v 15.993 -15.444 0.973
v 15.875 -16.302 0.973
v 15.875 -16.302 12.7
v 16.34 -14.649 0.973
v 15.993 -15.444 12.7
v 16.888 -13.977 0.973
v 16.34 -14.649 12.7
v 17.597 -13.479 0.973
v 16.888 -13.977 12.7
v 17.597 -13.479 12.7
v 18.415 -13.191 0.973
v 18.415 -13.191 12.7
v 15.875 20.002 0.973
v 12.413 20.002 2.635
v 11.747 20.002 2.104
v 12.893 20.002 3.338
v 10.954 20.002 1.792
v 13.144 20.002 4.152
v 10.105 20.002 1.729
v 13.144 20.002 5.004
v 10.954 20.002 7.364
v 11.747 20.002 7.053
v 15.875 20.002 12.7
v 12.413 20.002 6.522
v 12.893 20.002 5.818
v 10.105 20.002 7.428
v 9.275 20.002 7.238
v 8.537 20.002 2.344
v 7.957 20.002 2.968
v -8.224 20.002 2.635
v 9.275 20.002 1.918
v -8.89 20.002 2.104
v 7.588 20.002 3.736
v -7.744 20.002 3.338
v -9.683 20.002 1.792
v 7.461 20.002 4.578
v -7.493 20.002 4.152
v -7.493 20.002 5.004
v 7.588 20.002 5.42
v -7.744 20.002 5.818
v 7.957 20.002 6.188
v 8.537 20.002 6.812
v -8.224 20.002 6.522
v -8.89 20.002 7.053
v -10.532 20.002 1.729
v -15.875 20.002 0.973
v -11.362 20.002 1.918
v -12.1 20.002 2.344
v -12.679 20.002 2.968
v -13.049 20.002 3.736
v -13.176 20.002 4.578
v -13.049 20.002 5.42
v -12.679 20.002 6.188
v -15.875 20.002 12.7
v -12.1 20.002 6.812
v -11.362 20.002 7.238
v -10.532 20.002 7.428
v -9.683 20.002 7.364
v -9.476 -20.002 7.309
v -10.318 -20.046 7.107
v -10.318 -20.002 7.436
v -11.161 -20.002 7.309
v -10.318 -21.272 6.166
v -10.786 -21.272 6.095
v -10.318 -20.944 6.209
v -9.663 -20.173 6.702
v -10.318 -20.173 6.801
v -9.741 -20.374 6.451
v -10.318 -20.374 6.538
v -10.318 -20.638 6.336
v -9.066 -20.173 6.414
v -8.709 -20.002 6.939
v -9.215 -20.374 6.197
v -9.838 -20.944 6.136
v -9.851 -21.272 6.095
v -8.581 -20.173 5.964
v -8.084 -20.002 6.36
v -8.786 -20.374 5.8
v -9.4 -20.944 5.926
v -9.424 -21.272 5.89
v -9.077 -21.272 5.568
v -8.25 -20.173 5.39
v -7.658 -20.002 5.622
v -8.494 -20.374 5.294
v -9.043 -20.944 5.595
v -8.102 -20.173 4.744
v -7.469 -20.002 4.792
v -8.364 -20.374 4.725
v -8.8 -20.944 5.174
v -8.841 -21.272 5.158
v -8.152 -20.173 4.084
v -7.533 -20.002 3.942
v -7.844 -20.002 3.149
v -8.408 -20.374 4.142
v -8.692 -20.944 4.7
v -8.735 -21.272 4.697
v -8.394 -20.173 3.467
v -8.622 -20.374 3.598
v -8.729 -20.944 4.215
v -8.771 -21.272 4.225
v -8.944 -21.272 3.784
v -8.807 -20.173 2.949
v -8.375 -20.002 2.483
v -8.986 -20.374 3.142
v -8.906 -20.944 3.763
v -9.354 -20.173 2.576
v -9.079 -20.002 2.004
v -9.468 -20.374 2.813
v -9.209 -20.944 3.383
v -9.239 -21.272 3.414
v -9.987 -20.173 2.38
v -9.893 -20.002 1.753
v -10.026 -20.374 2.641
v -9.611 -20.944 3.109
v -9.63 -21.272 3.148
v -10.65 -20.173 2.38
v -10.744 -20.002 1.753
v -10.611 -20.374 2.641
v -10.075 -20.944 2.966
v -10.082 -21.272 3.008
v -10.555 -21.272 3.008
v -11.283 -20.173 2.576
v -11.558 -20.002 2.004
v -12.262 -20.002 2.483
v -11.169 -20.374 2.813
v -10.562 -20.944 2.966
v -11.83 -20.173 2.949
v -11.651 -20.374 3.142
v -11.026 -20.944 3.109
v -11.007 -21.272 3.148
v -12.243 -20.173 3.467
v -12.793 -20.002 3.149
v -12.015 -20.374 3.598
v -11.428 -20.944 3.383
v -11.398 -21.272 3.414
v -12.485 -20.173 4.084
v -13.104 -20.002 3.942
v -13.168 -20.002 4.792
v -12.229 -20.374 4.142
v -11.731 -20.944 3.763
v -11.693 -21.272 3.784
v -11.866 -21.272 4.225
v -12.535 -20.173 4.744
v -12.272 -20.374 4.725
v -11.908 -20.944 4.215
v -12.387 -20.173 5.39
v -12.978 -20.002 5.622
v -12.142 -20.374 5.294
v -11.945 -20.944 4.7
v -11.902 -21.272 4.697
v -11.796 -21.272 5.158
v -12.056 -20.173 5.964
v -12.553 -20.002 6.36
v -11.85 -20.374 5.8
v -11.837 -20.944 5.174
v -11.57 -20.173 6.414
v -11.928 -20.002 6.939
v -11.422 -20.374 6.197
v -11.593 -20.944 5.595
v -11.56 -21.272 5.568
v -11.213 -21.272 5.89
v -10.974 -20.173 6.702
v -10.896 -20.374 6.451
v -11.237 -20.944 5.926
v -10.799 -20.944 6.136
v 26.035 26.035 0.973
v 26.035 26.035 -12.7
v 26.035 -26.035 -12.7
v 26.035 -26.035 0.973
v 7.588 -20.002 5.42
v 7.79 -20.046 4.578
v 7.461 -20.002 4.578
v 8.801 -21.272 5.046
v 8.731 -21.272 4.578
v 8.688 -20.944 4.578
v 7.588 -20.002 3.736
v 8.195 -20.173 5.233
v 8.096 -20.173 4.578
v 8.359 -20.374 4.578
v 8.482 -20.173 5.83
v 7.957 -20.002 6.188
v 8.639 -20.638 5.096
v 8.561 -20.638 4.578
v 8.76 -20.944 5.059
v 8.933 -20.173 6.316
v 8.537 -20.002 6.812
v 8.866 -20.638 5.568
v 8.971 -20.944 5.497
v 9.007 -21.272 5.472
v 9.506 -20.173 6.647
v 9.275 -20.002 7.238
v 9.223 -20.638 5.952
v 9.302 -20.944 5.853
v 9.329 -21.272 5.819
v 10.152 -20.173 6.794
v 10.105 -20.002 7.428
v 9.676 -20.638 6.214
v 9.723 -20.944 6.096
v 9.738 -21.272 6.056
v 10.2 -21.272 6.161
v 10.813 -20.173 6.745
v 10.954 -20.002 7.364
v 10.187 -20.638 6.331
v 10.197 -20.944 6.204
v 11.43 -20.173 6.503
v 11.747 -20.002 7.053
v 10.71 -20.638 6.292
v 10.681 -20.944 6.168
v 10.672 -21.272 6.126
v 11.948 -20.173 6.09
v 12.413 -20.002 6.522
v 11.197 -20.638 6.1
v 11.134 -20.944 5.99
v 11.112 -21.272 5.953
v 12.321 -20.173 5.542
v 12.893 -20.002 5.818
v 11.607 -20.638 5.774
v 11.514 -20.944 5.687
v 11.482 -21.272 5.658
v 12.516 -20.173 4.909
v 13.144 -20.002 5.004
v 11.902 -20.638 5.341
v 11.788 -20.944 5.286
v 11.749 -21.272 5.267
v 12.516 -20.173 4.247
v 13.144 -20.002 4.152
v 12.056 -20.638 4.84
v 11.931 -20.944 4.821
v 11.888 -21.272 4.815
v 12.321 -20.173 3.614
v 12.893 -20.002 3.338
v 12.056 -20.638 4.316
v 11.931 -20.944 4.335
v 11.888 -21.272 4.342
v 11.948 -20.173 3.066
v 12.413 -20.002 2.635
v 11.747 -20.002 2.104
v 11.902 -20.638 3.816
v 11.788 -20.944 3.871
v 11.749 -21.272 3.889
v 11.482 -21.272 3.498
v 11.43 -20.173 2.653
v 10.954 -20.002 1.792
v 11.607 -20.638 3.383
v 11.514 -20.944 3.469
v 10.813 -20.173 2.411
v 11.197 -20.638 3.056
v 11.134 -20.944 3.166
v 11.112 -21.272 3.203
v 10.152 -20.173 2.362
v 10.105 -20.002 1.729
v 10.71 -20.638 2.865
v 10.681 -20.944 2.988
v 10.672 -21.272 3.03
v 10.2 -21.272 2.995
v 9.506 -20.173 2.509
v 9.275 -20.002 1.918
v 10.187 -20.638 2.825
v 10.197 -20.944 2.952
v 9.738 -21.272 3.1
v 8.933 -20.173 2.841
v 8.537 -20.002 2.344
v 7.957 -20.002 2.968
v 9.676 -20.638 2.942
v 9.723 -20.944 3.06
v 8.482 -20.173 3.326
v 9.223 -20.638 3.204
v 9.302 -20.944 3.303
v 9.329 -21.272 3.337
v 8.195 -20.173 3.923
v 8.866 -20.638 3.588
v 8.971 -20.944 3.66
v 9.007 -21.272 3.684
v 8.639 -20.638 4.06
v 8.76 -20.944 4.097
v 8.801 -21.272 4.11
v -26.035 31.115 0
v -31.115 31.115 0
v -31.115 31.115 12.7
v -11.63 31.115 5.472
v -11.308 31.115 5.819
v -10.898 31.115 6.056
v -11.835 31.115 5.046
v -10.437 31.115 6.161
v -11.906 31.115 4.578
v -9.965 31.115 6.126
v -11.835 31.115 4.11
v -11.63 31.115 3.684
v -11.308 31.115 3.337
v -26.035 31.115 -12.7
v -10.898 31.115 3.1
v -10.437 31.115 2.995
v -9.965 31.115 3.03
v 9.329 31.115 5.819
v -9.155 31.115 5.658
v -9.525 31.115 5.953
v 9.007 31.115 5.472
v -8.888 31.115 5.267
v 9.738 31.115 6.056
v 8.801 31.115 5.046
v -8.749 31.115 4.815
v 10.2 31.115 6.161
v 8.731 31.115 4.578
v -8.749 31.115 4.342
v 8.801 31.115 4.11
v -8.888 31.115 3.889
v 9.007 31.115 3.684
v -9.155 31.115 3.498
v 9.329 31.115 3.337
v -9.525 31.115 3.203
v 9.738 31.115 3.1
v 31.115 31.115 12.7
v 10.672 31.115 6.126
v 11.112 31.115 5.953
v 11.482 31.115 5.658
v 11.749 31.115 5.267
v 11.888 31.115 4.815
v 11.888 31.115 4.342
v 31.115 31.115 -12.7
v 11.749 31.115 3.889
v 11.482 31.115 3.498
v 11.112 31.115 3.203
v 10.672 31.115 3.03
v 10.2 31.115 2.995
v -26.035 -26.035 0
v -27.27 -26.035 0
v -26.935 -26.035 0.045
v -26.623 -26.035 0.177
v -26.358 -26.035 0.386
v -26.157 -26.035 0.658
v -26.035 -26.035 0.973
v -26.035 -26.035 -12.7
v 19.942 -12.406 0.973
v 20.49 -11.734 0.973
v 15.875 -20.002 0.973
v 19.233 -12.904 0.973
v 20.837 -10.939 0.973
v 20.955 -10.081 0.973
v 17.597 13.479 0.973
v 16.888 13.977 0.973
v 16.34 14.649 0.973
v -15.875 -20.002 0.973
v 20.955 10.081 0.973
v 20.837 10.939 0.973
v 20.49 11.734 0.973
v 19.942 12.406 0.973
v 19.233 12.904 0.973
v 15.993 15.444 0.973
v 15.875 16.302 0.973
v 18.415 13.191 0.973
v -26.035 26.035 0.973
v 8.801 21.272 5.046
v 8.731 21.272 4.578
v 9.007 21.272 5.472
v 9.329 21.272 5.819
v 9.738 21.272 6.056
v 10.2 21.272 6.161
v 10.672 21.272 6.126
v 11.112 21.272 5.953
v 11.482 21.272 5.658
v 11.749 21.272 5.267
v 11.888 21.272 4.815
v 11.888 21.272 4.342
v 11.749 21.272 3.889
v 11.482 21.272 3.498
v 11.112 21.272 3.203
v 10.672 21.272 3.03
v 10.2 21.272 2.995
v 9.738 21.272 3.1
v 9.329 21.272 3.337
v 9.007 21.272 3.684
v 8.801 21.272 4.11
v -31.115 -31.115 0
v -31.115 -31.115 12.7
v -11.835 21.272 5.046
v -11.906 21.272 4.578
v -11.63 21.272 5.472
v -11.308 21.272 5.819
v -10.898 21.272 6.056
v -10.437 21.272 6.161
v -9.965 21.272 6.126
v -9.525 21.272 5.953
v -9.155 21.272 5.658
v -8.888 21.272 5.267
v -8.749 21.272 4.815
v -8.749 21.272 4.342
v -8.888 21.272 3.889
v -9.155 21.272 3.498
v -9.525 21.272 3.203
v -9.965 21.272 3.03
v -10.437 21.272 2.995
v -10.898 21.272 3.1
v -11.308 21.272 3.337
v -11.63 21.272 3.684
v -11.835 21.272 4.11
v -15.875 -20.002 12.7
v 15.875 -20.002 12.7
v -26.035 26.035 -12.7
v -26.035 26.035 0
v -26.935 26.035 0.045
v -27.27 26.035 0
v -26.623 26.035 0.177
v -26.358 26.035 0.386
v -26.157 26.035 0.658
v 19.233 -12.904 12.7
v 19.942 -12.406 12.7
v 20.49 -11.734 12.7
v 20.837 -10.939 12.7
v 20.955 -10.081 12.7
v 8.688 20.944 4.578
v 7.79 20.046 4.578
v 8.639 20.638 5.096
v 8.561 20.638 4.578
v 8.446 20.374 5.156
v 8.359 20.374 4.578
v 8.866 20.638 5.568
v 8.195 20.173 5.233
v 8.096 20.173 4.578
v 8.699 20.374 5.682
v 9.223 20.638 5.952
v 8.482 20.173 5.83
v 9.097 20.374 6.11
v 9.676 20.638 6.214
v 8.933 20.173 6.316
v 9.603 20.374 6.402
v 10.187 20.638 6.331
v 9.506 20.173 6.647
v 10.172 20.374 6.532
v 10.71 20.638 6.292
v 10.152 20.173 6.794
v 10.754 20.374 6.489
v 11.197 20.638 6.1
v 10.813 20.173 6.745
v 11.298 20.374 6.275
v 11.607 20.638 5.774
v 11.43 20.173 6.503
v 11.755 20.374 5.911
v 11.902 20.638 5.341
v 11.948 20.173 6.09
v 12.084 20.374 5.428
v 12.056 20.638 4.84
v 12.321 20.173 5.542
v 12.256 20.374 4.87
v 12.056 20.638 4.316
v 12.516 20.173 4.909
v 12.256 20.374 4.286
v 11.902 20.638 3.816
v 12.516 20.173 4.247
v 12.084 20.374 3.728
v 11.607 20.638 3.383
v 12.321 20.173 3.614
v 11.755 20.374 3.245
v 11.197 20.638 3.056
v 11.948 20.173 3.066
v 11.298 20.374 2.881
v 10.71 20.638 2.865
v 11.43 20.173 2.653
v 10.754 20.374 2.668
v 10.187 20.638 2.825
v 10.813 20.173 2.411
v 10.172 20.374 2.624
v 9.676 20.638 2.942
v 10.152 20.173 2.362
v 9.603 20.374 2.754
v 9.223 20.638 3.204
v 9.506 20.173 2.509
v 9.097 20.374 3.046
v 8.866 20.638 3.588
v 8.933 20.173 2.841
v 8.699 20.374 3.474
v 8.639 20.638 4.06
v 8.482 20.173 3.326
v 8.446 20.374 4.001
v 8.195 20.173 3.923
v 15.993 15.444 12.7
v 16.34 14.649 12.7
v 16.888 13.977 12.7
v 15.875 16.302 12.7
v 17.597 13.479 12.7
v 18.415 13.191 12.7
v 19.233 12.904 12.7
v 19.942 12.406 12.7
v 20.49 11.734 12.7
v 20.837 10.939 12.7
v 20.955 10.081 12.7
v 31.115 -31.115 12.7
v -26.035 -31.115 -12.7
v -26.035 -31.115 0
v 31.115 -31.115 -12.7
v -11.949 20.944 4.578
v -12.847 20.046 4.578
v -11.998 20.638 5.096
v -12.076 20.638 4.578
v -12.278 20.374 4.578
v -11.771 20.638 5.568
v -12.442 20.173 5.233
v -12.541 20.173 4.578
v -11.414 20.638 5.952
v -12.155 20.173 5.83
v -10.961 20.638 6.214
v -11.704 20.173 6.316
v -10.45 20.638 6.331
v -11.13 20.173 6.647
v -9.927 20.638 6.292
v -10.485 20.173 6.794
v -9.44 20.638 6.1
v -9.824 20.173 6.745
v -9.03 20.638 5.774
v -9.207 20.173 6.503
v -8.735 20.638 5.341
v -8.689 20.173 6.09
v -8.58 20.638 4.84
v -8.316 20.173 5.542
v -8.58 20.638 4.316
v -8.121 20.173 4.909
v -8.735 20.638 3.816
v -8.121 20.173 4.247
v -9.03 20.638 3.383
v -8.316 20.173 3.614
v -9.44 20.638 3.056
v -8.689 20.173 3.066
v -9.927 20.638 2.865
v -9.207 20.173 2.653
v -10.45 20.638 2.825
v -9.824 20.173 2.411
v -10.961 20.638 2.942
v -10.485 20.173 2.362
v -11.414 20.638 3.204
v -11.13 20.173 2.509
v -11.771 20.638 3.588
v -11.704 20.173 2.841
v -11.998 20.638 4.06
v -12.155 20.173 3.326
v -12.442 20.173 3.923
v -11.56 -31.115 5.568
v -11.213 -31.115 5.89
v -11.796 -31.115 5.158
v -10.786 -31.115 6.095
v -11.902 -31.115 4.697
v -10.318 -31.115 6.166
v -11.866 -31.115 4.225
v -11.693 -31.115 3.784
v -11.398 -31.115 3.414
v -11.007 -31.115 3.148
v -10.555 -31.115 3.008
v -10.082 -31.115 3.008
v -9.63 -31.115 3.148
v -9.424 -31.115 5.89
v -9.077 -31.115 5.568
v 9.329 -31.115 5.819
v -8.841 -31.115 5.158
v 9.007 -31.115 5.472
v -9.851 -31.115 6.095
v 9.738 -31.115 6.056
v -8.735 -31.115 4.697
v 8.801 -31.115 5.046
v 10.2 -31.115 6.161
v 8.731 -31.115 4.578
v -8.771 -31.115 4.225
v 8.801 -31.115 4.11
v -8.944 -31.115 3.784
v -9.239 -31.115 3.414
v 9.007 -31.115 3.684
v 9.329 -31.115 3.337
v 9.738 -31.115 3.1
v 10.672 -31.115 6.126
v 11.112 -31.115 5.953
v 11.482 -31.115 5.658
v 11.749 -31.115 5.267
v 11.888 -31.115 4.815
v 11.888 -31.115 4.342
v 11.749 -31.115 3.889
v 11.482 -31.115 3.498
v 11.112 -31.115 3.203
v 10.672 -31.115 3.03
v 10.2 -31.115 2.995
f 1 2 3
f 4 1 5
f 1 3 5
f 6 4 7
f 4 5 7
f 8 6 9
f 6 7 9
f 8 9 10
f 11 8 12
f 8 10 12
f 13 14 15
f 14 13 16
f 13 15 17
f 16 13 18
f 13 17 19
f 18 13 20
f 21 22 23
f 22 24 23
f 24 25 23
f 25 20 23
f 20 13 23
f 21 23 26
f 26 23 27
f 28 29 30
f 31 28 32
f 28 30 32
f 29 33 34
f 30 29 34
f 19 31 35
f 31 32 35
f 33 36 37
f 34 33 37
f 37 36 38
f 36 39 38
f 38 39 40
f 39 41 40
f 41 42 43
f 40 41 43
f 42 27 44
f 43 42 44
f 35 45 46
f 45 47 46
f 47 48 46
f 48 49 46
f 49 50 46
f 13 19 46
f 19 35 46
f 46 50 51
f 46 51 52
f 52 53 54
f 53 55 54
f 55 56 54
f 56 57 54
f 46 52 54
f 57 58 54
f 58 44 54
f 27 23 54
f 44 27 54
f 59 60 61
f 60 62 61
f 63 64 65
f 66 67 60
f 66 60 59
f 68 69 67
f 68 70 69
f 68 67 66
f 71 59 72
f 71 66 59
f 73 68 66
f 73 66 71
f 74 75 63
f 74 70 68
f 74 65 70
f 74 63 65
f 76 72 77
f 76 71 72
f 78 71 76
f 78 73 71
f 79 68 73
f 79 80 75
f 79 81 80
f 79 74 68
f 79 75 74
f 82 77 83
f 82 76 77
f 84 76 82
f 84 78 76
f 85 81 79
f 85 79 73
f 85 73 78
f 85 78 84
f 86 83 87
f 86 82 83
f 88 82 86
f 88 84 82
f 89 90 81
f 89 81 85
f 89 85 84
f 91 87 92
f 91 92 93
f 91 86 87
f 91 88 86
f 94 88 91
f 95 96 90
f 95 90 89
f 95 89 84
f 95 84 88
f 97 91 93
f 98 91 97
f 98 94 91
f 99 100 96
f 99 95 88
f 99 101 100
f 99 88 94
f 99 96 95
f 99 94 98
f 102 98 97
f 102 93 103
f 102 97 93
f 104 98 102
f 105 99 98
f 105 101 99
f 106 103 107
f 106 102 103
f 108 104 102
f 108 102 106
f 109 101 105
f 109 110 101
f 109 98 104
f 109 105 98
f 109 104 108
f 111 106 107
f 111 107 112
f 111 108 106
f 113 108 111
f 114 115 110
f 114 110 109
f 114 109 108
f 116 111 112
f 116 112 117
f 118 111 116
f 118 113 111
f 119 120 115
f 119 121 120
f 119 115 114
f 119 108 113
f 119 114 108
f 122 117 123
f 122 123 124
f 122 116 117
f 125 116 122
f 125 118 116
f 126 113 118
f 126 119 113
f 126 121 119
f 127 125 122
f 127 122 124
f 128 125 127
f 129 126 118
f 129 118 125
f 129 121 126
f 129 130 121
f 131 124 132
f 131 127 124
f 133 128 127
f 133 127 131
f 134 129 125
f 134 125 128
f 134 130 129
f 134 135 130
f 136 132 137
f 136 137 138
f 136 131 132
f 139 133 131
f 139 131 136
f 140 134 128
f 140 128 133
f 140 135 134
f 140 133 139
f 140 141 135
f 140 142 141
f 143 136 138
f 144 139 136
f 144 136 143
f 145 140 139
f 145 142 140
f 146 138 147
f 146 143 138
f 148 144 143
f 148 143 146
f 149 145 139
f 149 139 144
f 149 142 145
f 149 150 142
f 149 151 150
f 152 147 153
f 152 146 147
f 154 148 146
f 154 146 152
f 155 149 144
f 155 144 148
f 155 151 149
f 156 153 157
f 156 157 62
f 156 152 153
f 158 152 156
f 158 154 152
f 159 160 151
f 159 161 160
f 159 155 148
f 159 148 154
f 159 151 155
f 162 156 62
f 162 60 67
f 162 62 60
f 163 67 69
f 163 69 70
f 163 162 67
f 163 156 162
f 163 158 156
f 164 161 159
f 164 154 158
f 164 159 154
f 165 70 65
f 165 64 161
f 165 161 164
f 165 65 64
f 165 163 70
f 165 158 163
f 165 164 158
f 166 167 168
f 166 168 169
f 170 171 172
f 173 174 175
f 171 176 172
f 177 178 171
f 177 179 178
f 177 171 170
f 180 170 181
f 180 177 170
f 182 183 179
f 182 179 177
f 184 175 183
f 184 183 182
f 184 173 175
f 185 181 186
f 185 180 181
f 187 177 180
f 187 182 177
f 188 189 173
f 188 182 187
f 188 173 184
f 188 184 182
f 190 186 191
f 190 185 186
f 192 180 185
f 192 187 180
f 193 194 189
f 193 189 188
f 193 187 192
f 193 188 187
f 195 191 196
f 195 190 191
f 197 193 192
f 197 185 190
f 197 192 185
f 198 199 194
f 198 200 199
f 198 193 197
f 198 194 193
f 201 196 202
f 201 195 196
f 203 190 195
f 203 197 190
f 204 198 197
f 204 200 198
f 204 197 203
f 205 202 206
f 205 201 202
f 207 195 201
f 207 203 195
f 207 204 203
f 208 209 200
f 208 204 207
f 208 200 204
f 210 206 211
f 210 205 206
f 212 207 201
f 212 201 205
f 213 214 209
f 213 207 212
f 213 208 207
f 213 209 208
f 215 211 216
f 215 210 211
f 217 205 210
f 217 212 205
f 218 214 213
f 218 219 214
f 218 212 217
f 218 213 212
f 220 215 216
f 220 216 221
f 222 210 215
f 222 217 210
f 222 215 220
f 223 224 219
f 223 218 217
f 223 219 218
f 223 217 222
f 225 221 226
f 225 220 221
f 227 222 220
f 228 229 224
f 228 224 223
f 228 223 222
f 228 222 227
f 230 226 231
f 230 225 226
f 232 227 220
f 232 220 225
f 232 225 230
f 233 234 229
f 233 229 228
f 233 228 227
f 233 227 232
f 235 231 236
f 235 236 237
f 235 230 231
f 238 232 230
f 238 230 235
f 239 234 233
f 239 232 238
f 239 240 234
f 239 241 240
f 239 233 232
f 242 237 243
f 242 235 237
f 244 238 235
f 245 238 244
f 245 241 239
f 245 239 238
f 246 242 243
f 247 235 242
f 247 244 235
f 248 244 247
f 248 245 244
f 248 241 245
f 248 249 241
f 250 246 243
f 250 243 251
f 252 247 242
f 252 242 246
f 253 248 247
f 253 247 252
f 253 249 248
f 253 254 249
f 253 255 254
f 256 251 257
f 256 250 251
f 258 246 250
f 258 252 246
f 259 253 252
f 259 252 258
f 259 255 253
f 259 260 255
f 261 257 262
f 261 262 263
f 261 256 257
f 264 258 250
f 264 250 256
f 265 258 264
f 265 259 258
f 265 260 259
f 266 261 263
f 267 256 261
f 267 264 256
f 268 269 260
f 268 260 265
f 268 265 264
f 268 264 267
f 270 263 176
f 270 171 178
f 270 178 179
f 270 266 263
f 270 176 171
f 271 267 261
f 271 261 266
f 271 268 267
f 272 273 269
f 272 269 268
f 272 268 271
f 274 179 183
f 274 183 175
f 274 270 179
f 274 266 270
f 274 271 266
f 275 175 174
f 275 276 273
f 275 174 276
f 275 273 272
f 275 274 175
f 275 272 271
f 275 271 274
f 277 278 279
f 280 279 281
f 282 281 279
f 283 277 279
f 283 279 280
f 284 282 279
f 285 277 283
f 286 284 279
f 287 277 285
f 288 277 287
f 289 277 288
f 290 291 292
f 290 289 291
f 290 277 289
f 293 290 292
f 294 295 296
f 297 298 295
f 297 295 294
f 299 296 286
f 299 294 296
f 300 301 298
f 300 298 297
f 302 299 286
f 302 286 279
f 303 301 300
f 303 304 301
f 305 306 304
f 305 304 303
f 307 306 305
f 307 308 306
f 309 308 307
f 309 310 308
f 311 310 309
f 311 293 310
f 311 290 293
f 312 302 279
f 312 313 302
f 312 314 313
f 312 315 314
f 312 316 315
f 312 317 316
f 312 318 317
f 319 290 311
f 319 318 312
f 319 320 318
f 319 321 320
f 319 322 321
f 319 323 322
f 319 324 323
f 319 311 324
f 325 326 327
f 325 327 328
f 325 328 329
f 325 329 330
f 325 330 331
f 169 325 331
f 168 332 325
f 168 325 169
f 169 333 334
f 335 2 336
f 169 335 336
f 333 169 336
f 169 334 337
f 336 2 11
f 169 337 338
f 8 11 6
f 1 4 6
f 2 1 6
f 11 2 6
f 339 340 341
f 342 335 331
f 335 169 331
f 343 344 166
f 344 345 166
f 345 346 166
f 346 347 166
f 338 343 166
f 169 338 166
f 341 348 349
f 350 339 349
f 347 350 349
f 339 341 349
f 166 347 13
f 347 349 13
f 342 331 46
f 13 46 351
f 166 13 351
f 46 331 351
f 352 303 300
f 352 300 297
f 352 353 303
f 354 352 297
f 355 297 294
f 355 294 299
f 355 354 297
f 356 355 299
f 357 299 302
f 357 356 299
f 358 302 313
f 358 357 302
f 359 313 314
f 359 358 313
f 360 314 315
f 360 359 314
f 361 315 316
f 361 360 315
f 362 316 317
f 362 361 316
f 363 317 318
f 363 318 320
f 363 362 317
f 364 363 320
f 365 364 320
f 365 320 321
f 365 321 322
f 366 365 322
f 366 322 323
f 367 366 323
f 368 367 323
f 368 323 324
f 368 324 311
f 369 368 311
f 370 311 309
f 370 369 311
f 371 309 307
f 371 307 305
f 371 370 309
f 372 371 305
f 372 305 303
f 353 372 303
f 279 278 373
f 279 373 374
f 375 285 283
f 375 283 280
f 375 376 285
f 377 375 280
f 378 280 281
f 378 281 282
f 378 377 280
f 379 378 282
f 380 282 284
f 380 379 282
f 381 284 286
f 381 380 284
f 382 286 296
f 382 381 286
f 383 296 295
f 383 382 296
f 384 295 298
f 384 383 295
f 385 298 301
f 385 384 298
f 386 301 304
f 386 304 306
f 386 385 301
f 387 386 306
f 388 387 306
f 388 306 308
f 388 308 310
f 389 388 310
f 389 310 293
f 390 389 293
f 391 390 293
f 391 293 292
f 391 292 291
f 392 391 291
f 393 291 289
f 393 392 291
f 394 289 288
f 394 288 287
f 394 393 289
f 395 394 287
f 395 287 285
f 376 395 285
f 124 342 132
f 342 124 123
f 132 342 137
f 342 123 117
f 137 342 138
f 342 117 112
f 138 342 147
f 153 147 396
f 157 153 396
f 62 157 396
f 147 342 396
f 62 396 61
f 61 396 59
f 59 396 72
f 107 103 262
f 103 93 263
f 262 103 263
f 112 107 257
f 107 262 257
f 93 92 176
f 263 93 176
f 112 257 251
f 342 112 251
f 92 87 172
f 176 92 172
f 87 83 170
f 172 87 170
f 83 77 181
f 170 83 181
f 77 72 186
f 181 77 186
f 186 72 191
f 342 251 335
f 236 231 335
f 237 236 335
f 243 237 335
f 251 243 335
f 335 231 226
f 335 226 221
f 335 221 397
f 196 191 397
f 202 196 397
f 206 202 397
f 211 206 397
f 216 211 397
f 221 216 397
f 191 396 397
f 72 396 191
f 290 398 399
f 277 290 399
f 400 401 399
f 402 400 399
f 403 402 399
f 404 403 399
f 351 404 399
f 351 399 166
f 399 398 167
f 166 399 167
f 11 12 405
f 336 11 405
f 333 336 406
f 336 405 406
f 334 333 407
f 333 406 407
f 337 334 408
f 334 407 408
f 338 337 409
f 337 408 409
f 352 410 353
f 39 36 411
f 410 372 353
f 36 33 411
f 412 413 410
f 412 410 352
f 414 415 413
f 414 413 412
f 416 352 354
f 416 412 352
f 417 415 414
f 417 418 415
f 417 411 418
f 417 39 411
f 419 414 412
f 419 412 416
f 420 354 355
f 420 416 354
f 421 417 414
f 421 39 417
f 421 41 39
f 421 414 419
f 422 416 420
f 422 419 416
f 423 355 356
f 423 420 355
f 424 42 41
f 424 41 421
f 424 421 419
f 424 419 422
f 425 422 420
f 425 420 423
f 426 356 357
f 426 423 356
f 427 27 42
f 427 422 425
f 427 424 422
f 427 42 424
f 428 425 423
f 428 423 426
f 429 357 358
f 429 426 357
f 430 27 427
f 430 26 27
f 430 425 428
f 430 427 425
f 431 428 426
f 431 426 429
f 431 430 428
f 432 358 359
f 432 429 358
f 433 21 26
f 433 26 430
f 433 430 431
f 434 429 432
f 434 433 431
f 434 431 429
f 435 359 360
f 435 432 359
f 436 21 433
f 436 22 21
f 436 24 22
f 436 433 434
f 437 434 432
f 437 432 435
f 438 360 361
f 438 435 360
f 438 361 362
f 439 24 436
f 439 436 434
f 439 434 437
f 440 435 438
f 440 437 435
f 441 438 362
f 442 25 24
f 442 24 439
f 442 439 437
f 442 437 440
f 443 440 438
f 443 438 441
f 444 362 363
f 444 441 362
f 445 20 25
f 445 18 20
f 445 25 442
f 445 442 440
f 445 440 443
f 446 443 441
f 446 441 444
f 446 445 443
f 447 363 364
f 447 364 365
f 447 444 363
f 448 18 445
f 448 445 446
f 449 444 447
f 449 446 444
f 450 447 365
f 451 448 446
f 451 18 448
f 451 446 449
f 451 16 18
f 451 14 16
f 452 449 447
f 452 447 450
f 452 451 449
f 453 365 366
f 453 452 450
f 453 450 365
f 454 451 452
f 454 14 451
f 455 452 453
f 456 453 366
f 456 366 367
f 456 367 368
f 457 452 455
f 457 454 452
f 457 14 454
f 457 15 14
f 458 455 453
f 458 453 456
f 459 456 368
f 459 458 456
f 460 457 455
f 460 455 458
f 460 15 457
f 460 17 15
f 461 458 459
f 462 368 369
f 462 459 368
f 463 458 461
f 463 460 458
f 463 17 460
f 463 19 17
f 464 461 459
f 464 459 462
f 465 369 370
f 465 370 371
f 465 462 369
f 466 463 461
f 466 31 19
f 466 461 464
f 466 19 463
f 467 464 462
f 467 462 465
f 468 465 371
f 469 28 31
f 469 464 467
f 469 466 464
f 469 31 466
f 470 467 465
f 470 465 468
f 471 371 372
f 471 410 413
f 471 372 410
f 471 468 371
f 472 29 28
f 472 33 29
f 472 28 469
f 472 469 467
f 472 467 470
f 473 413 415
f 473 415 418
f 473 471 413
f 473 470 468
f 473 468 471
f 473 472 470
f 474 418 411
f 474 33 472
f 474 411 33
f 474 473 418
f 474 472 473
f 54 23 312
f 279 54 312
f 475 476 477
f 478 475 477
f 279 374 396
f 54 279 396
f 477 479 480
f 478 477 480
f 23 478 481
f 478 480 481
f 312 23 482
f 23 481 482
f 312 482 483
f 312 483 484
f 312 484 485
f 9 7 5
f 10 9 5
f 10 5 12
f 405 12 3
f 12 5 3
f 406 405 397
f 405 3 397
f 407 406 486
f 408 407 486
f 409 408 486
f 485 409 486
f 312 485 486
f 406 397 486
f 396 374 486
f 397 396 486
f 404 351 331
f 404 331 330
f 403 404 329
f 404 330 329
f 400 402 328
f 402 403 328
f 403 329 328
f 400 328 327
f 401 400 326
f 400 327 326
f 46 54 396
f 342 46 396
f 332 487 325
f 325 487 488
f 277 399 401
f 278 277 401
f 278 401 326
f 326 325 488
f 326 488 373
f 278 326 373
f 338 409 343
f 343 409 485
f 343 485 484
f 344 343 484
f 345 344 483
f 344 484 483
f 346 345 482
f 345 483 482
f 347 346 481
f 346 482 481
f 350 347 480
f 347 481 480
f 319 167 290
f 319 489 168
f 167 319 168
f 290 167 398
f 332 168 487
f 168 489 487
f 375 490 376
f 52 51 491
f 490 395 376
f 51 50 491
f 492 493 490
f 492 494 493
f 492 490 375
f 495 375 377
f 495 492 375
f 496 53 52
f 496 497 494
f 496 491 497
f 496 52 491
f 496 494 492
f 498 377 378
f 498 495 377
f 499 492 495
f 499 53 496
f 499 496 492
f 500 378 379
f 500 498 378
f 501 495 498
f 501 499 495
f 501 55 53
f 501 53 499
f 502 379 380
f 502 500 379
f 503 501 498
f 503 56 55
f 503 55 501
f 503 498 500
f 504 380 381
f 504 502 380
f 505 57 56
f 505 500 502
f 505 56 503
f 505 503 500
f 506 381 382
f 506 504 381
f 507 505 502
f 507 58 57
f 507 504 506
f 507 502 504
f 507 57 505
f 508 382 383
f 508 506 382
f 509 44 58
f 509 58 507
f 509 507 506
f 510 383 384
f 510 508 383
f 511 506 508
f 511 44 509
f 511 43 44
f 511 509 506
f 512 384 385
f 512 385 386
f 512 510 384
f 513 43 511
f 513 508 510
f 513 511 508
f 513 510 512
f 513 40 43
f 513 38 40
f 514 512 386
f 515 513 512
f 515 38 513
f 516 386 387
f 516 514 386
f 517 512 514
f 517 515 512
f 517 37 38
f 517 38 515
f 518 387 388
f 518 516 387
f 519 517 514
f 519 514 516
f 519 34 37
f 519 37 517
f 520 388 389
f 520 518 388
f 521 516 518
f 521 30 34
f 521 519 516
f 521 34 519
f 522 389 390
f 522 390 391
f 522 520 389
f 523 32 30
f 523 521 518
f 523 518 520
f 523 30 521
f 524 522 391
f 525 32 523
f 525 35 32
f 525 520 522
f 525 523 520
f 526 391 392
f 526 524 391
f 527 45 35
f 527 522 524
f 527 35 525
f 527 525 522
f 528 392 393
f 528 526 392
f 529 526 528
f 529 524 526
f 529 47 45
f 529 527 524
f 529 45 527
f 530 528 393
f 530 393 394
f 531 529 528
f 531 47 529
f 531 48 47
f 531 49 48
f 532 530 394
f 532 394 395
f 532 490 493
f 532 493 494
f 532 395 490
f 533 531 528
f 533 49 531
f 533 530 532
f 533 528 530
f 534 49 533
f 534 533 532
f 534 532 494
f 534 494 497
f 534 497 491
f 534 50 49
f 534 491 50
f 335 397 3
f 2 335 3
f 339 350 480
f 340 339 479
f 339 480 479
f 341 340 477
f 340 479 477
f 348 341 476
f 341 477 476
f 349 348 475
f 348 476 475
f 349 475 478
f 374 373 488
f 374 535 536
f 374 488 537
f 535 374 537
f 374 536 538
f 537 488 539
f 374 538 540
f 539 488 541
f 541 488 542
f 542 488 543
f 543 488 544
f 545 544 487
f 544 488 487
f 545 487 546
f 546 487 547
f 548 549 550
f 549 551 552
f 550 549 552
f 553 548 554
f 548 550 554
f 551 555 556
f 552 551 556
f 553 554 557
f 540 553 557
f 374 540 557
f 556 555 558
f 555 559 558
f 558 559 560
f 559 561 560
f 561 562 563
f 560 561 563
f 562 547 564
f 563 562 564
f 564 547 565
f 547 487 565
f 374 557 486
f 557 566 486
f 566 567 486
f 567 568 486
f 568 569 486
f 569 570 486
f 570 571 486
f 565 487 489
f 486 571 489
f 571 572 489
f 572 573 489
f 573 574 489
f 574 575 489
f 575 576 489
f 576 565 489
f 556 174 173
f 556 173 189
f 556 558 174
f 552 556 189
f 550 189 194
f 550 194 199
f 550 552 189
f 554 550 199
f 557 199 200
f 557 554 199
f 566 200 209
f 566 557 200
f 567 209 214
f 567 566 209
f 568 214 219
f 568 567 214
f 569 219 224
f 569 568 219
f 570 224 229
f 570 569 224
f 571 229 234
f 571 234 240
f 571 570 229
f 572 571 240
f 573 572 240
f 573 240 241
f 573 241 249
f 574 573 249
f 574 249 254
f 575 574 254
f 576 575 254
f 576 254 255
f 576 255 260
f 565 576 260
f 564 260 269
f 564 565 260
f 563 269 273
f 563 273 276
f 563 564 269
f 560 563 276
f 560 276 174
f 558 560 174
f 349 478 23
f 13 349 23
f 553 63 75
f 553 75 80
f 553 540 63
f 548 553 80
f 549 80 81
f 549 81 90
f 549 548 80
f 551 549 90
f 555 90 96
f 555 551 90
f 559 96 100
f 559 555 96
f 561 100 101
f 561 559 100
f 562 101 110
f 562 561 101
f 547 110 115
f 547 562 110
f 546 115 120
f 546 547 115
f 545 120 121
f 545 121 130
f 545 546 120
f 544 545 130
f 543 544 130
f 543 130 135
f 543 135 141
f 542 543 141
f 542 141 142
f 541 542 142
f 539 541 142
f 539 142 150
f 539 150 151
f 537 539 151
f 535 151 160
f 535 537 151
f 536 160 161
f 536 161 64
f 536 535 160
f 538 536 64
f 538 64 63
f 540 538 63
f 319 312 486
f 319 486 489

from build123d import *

# Parameters (mm, degrees)
BOSS_EXTRUDE1_START   = -31.115
BOSS_EXTRUDE1_DEPTH   = 62.23
BOSS_EXTRUDE1_2_DEPTH = 5.08
BOSS_EXTRUDE1_START_2 = 26.035
BOSS_EXTRUDE1_3_DEPTH = 5.08
SKETCH2_W             = 13.672898009
SKETCH2_H             = 52.07
CUT_EXTRUDE1_DEPTH    = 52.07
CUT_EXTRUDE3_DEPTH    = 51.80793688


with BuildPart() as part:
    # Boss-Extrude1: read off the stored shape, not the designer's step
    # Boss-Extrude1 outline → Boss-Extrude1 (new body)
    with BuildSketch(Plane(origin=(0, 0, 0), x_dir=(1, 0, 0), z_dir=(0, 1, 0)).offset(BOSS_EXTRUDE1_START)):
        with BuildLine():
            Line((-26.035, 12.7), (-26.035, -0.972898009))
            ThreePointArc((-26.035, -0.972898009), (-26.483762918, -0.272448114), (-27.269759251, 0))
            Line((-27.269759251, 0), (-31.115, 0))
            Line((-31.115, 0), (-31.115, -12.7))
            Line((-31.115, -12.7), (31.115, -12.7))
            Line((31.115, -12.7), (31.115, 12.7))
            Line((31.115, 12.7), (-26.035, 12.7))
        make_face()
    extrude(amount=BOSS_EXTRUDE1_DEPTH)

    # Boss-Extrude1 2 outline → Boss-Extrude1 2 (add)
    with BuildSketch(Plane(origin=(0, 0, 0), x_dir=(1, 0, 0), z_dir=(0, 1, 0)).offset(BOSS_EXTRUDE1_START)):
        with BuildLine():
            Line((-26.035, -0.972898009), (-26.035, 0))
            Line((-26.035, 0), (-27.269759251, 0))
            ThreePointArc((-27.269759251, 0), (-26.483762918, -0.272448114), (-26.035, -0.972898009))
        make_face()
    extrude(amount=BOSS_EXTRUDE1_2_DEPTH)

    # Boss-Extrude1 3 outline → Boss-Extrude1 3 (add)
    with BuildSketch(Plane(origin=(0, 0, 0), x_dir=(1, 0, 0), z_dir=(0, 1, 0)).offset(BOSS_EXTRUDE1_START_2)):
        with BuildLine():
            Line((-26.035, -0.972898009), (-26.035, 0))
            Line((-26.035, 0), (-27.269759251, 0))
            ThreePointArc((-27.269759251, 0), (-26.483762918, -0.272448114), (-26.035, -0.972898009))
        make_face()
    extrude(amount=BOSS_EXTRUDE1_3_DEPTH)

    # Sketch2 → Cut-Extrude1 (cut)
    with BuildSketch(Plane.ZY.offset(26.035)):
        with Locations((-5.863550996, 0)):
            Rectangle(SKETCH2_W, SKETCH2_H)
    extrude(amount=-CUT_EXTRUDE1_DEPTH, mode=Mode.SUBTRACT)

    # Sketch4 → Cut-Extrude3 (cut, through all)
    with BuildSketch(Plane.XY.offset(12.7)):
        with BuildLine():
            Line((15.875, 16.302284846), (15.875, 20.0025))
            Line((15.875, 20.0025), (-15.875, 20.0025))
            Line((-15.875, 20.0025), (-15.875, -20.0025))
            Line((-15.875, -20.0025), (15.875, -20.0025))
            Line((15.875, -20.0025), (15.875, -16.302284846))
            ThreePointArc((15.875, -16.302284846), (16.590655575, -14.294238532), (18.415, -13.191432873))
            ThreePointArc((18.415, -13.191432873), (20.239344425, -12.088627214), (20.955, -10.0805809))
            Line((20.955, -10.0805809), (20.955, 10.0805809))
            ThreePointArc((20.955, 10.0805809), (20.239344425, 12.088627214), (18.415, 13.191432873))
            ThreePointArc((18.415, 13.191432873), (16.590655575, 14.294238532), (15.875, 16.302284846))
        make_face()
    extrude(amount=-CUT_EXTRUDE3_DEPTH, mode=Mode.SUBTRACT)

    # Sketch5 → Cut-Revolve1 (revolve, cut)
    with BuildSketch(Plane(origin=(0, 0, 4.578168392), x_dir=(-1, 0, 0), z_dir=(0, 0, -1)), mode=Mode.PRIVATE) as cut_revolve1_sk:
        with BuildLine():
            Line((8.730963547, -31.115), (10.318463547, -31.115))
            Line((10.318463547, -31.115), (10.318463547, -20.0025))
            Line((10.318463547, -20.0025), (7.460963547, -20.0025))
            ThreePointArc((7.460963547, -20.0025), (8.358989159, -20.374474388), (8.730963547, -21.2725))
            Line((8.730963547, -21.2725), (8.730963547, -31.115))
        make_face()
    revolve(cut_revolve1_sk.sketch.rotate(Axis((-10.318463547, -31.115, 4.578168392), (0, 1, 0)), 270), axis=Axis((-10.318463547, -31.115, 4.578168392), (0, 1, 0)), mode=Mode.SUBTRACT)

    # Sketch6 → Cut-Revolve2 (revolve, cut)
    with BuildSketch(Plane(origin=(0, 0, 4.578168392), x_dir=(-1, 0, 0), z_dir=(0, 0, -1)), mode=Mode.PRIVATE) as cut_revolve2_sk:
        with BuildLine():
            Line((-11.905963547, -31.115), (-10.318463547, -31.115))
            Line((-10.318463547, -31.115), (-10.318463547, -20.0025))
            Line((-10.318463547, -20.0025), (-13.175963547, -20.0025))
            ThreePointArc((-13.175963547, -20.0025), (-12.277937935, -20.374474388), (-11.905963547, -21.2725))
            Line((-11.905963547, -21.2725), (-11.905963547, -31.115))
        make_face()
    revolve(cut_revolve2_sk.sketch.rotate(Axis((10.318463547, -31.115, 4.578168392), (0, 1, 0)), 180), axis=Axis((10.318463547, -31.115, 4.578168392), (0, 1, 0)), mode=Mode.SUBTRACT)

    # Sketch7 → Cut-Revolve3 (revolve, cut)
    with BuildSketch(Plane(origin=(0, 0, 4.578168392), x_dir=(-1, 0, 0), z_dir=(0, 0, -1)), mode=Mode.PRIVATE) as cut_revolve3_sk:
        with BuildLine():
            Line((7.460963547, 20.0025), (10.318463547, 20.0025))
            Line((10.318463547, 20.0025), (10.318463547, 31.115))
            Line((10.318463547, 31.115), (8.730963547, 31.115))
            Line((8.730963547, 31.115), (8.730963547, 21.2725))
            ThreePointArc((8.730963547, 21.2725), (8.358989159, 20.374474388), (7.460963547, 20.0025))
        make_face()
    revolve(cut_revolve3_sk.sketch.rotate(Axis((-10.318463547, 20.0025, 4.578168392), (0, 1, 0)), 180), axis=Axis((-10.318463547, 20.0025, 4.578168392), (0, 1, 0)), mode=Mode.SUBTRACT)

    # Sketch8 → Cut-Revolve4 (revolve, cut)
    with BuildSketch(Plane(origin=(0, 0, 4.578168392), x_dir=(-1, 0, 0), z_dir=(0, 0, -1)), mode=Mode.PRIVATE) as cut_revolve4_sk:
        with BuildLine():
            Line((-13.175963547, 20.0025), (-10.318463547, 20.0025))
            Line((-10.318463547, 20.0025), (-10.318463547, 31.115))
            Line((-10.318463547, 31.115), (-11.905963547, 31.115))
            Line((-11.905963547, 31.115), (-11.905963547, 21.2725))
            ThreePointArc((-11.905963547, 21.2725), (-12.277937935, 20.374474388), (-13.175963547, 20.0025))
        make_face()
    revolve(cut_revolve4_sk.sketch.rotate(Axis((10.318463547, 20.0025, 4.578168392), (0, 1, 0)), 180), axis=Axis((10.318463547, 20.0025, 4.578168392), (0, 1, 0)), mode=Mode.SUBTRACT)


solid = part.part
